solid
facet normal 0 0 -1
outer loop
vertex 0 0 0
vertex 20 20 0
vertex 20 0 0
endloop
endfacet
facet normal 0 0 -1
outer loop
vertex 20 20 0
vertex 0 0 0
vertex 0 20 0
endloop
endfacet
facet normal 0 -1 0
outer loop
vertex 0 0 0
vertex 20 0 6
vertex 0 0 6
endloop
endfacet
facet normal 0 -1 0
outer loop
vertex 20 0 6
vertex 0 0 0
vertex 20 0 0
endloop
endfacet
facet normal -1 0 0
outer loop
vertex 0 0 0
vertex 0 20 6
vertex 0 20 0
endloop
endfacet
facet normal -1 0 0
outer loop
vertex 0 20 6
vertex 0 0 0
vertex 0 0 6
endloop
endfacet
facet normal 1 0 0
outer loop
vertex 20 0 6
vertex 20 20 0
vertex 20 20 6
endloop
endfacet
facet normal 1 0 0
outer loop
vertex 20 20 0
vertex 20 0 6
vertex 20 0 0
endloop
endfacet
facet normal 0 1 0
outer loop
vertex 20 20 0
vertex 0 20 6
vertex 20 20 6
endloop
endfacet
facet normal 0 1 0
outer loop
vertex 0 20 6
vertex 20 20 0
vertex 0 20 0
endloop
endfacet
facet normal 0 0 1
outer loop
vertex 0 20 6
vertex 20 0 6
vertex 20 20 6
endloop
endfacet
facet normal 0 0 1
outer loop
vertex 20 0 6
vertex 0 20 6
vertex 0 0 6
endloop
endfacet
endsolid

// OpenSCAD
altura=1;
lados=20;
rep=6;
color1="red";
color2="white";
color1boolean=true;
color2boolean=true;

module triangulo(x) {
  linear_extrude(height=x) polygon(points=[[0,0],[0,lados],[lados,0]]);
}

for (i=[0:altura:altura*(rep-1)]) {
  if ((i/altura)%2==0) {
    if (color1boolean) translate([0,0,i]) color(color1) triangulo(altura);
    if (color2boolean) translate([lados,lados,i]) color(color2) mirror([1,1,0]) triangulo(altura);
  } else {
    if (color2boolean) translate([0,0,i]) color(color2) triangulo(altura);
    if (color1boolean) translate([lados,lados,i]) color(color1) mirror([1,1,0]) triangulo(altura);
  }

}
